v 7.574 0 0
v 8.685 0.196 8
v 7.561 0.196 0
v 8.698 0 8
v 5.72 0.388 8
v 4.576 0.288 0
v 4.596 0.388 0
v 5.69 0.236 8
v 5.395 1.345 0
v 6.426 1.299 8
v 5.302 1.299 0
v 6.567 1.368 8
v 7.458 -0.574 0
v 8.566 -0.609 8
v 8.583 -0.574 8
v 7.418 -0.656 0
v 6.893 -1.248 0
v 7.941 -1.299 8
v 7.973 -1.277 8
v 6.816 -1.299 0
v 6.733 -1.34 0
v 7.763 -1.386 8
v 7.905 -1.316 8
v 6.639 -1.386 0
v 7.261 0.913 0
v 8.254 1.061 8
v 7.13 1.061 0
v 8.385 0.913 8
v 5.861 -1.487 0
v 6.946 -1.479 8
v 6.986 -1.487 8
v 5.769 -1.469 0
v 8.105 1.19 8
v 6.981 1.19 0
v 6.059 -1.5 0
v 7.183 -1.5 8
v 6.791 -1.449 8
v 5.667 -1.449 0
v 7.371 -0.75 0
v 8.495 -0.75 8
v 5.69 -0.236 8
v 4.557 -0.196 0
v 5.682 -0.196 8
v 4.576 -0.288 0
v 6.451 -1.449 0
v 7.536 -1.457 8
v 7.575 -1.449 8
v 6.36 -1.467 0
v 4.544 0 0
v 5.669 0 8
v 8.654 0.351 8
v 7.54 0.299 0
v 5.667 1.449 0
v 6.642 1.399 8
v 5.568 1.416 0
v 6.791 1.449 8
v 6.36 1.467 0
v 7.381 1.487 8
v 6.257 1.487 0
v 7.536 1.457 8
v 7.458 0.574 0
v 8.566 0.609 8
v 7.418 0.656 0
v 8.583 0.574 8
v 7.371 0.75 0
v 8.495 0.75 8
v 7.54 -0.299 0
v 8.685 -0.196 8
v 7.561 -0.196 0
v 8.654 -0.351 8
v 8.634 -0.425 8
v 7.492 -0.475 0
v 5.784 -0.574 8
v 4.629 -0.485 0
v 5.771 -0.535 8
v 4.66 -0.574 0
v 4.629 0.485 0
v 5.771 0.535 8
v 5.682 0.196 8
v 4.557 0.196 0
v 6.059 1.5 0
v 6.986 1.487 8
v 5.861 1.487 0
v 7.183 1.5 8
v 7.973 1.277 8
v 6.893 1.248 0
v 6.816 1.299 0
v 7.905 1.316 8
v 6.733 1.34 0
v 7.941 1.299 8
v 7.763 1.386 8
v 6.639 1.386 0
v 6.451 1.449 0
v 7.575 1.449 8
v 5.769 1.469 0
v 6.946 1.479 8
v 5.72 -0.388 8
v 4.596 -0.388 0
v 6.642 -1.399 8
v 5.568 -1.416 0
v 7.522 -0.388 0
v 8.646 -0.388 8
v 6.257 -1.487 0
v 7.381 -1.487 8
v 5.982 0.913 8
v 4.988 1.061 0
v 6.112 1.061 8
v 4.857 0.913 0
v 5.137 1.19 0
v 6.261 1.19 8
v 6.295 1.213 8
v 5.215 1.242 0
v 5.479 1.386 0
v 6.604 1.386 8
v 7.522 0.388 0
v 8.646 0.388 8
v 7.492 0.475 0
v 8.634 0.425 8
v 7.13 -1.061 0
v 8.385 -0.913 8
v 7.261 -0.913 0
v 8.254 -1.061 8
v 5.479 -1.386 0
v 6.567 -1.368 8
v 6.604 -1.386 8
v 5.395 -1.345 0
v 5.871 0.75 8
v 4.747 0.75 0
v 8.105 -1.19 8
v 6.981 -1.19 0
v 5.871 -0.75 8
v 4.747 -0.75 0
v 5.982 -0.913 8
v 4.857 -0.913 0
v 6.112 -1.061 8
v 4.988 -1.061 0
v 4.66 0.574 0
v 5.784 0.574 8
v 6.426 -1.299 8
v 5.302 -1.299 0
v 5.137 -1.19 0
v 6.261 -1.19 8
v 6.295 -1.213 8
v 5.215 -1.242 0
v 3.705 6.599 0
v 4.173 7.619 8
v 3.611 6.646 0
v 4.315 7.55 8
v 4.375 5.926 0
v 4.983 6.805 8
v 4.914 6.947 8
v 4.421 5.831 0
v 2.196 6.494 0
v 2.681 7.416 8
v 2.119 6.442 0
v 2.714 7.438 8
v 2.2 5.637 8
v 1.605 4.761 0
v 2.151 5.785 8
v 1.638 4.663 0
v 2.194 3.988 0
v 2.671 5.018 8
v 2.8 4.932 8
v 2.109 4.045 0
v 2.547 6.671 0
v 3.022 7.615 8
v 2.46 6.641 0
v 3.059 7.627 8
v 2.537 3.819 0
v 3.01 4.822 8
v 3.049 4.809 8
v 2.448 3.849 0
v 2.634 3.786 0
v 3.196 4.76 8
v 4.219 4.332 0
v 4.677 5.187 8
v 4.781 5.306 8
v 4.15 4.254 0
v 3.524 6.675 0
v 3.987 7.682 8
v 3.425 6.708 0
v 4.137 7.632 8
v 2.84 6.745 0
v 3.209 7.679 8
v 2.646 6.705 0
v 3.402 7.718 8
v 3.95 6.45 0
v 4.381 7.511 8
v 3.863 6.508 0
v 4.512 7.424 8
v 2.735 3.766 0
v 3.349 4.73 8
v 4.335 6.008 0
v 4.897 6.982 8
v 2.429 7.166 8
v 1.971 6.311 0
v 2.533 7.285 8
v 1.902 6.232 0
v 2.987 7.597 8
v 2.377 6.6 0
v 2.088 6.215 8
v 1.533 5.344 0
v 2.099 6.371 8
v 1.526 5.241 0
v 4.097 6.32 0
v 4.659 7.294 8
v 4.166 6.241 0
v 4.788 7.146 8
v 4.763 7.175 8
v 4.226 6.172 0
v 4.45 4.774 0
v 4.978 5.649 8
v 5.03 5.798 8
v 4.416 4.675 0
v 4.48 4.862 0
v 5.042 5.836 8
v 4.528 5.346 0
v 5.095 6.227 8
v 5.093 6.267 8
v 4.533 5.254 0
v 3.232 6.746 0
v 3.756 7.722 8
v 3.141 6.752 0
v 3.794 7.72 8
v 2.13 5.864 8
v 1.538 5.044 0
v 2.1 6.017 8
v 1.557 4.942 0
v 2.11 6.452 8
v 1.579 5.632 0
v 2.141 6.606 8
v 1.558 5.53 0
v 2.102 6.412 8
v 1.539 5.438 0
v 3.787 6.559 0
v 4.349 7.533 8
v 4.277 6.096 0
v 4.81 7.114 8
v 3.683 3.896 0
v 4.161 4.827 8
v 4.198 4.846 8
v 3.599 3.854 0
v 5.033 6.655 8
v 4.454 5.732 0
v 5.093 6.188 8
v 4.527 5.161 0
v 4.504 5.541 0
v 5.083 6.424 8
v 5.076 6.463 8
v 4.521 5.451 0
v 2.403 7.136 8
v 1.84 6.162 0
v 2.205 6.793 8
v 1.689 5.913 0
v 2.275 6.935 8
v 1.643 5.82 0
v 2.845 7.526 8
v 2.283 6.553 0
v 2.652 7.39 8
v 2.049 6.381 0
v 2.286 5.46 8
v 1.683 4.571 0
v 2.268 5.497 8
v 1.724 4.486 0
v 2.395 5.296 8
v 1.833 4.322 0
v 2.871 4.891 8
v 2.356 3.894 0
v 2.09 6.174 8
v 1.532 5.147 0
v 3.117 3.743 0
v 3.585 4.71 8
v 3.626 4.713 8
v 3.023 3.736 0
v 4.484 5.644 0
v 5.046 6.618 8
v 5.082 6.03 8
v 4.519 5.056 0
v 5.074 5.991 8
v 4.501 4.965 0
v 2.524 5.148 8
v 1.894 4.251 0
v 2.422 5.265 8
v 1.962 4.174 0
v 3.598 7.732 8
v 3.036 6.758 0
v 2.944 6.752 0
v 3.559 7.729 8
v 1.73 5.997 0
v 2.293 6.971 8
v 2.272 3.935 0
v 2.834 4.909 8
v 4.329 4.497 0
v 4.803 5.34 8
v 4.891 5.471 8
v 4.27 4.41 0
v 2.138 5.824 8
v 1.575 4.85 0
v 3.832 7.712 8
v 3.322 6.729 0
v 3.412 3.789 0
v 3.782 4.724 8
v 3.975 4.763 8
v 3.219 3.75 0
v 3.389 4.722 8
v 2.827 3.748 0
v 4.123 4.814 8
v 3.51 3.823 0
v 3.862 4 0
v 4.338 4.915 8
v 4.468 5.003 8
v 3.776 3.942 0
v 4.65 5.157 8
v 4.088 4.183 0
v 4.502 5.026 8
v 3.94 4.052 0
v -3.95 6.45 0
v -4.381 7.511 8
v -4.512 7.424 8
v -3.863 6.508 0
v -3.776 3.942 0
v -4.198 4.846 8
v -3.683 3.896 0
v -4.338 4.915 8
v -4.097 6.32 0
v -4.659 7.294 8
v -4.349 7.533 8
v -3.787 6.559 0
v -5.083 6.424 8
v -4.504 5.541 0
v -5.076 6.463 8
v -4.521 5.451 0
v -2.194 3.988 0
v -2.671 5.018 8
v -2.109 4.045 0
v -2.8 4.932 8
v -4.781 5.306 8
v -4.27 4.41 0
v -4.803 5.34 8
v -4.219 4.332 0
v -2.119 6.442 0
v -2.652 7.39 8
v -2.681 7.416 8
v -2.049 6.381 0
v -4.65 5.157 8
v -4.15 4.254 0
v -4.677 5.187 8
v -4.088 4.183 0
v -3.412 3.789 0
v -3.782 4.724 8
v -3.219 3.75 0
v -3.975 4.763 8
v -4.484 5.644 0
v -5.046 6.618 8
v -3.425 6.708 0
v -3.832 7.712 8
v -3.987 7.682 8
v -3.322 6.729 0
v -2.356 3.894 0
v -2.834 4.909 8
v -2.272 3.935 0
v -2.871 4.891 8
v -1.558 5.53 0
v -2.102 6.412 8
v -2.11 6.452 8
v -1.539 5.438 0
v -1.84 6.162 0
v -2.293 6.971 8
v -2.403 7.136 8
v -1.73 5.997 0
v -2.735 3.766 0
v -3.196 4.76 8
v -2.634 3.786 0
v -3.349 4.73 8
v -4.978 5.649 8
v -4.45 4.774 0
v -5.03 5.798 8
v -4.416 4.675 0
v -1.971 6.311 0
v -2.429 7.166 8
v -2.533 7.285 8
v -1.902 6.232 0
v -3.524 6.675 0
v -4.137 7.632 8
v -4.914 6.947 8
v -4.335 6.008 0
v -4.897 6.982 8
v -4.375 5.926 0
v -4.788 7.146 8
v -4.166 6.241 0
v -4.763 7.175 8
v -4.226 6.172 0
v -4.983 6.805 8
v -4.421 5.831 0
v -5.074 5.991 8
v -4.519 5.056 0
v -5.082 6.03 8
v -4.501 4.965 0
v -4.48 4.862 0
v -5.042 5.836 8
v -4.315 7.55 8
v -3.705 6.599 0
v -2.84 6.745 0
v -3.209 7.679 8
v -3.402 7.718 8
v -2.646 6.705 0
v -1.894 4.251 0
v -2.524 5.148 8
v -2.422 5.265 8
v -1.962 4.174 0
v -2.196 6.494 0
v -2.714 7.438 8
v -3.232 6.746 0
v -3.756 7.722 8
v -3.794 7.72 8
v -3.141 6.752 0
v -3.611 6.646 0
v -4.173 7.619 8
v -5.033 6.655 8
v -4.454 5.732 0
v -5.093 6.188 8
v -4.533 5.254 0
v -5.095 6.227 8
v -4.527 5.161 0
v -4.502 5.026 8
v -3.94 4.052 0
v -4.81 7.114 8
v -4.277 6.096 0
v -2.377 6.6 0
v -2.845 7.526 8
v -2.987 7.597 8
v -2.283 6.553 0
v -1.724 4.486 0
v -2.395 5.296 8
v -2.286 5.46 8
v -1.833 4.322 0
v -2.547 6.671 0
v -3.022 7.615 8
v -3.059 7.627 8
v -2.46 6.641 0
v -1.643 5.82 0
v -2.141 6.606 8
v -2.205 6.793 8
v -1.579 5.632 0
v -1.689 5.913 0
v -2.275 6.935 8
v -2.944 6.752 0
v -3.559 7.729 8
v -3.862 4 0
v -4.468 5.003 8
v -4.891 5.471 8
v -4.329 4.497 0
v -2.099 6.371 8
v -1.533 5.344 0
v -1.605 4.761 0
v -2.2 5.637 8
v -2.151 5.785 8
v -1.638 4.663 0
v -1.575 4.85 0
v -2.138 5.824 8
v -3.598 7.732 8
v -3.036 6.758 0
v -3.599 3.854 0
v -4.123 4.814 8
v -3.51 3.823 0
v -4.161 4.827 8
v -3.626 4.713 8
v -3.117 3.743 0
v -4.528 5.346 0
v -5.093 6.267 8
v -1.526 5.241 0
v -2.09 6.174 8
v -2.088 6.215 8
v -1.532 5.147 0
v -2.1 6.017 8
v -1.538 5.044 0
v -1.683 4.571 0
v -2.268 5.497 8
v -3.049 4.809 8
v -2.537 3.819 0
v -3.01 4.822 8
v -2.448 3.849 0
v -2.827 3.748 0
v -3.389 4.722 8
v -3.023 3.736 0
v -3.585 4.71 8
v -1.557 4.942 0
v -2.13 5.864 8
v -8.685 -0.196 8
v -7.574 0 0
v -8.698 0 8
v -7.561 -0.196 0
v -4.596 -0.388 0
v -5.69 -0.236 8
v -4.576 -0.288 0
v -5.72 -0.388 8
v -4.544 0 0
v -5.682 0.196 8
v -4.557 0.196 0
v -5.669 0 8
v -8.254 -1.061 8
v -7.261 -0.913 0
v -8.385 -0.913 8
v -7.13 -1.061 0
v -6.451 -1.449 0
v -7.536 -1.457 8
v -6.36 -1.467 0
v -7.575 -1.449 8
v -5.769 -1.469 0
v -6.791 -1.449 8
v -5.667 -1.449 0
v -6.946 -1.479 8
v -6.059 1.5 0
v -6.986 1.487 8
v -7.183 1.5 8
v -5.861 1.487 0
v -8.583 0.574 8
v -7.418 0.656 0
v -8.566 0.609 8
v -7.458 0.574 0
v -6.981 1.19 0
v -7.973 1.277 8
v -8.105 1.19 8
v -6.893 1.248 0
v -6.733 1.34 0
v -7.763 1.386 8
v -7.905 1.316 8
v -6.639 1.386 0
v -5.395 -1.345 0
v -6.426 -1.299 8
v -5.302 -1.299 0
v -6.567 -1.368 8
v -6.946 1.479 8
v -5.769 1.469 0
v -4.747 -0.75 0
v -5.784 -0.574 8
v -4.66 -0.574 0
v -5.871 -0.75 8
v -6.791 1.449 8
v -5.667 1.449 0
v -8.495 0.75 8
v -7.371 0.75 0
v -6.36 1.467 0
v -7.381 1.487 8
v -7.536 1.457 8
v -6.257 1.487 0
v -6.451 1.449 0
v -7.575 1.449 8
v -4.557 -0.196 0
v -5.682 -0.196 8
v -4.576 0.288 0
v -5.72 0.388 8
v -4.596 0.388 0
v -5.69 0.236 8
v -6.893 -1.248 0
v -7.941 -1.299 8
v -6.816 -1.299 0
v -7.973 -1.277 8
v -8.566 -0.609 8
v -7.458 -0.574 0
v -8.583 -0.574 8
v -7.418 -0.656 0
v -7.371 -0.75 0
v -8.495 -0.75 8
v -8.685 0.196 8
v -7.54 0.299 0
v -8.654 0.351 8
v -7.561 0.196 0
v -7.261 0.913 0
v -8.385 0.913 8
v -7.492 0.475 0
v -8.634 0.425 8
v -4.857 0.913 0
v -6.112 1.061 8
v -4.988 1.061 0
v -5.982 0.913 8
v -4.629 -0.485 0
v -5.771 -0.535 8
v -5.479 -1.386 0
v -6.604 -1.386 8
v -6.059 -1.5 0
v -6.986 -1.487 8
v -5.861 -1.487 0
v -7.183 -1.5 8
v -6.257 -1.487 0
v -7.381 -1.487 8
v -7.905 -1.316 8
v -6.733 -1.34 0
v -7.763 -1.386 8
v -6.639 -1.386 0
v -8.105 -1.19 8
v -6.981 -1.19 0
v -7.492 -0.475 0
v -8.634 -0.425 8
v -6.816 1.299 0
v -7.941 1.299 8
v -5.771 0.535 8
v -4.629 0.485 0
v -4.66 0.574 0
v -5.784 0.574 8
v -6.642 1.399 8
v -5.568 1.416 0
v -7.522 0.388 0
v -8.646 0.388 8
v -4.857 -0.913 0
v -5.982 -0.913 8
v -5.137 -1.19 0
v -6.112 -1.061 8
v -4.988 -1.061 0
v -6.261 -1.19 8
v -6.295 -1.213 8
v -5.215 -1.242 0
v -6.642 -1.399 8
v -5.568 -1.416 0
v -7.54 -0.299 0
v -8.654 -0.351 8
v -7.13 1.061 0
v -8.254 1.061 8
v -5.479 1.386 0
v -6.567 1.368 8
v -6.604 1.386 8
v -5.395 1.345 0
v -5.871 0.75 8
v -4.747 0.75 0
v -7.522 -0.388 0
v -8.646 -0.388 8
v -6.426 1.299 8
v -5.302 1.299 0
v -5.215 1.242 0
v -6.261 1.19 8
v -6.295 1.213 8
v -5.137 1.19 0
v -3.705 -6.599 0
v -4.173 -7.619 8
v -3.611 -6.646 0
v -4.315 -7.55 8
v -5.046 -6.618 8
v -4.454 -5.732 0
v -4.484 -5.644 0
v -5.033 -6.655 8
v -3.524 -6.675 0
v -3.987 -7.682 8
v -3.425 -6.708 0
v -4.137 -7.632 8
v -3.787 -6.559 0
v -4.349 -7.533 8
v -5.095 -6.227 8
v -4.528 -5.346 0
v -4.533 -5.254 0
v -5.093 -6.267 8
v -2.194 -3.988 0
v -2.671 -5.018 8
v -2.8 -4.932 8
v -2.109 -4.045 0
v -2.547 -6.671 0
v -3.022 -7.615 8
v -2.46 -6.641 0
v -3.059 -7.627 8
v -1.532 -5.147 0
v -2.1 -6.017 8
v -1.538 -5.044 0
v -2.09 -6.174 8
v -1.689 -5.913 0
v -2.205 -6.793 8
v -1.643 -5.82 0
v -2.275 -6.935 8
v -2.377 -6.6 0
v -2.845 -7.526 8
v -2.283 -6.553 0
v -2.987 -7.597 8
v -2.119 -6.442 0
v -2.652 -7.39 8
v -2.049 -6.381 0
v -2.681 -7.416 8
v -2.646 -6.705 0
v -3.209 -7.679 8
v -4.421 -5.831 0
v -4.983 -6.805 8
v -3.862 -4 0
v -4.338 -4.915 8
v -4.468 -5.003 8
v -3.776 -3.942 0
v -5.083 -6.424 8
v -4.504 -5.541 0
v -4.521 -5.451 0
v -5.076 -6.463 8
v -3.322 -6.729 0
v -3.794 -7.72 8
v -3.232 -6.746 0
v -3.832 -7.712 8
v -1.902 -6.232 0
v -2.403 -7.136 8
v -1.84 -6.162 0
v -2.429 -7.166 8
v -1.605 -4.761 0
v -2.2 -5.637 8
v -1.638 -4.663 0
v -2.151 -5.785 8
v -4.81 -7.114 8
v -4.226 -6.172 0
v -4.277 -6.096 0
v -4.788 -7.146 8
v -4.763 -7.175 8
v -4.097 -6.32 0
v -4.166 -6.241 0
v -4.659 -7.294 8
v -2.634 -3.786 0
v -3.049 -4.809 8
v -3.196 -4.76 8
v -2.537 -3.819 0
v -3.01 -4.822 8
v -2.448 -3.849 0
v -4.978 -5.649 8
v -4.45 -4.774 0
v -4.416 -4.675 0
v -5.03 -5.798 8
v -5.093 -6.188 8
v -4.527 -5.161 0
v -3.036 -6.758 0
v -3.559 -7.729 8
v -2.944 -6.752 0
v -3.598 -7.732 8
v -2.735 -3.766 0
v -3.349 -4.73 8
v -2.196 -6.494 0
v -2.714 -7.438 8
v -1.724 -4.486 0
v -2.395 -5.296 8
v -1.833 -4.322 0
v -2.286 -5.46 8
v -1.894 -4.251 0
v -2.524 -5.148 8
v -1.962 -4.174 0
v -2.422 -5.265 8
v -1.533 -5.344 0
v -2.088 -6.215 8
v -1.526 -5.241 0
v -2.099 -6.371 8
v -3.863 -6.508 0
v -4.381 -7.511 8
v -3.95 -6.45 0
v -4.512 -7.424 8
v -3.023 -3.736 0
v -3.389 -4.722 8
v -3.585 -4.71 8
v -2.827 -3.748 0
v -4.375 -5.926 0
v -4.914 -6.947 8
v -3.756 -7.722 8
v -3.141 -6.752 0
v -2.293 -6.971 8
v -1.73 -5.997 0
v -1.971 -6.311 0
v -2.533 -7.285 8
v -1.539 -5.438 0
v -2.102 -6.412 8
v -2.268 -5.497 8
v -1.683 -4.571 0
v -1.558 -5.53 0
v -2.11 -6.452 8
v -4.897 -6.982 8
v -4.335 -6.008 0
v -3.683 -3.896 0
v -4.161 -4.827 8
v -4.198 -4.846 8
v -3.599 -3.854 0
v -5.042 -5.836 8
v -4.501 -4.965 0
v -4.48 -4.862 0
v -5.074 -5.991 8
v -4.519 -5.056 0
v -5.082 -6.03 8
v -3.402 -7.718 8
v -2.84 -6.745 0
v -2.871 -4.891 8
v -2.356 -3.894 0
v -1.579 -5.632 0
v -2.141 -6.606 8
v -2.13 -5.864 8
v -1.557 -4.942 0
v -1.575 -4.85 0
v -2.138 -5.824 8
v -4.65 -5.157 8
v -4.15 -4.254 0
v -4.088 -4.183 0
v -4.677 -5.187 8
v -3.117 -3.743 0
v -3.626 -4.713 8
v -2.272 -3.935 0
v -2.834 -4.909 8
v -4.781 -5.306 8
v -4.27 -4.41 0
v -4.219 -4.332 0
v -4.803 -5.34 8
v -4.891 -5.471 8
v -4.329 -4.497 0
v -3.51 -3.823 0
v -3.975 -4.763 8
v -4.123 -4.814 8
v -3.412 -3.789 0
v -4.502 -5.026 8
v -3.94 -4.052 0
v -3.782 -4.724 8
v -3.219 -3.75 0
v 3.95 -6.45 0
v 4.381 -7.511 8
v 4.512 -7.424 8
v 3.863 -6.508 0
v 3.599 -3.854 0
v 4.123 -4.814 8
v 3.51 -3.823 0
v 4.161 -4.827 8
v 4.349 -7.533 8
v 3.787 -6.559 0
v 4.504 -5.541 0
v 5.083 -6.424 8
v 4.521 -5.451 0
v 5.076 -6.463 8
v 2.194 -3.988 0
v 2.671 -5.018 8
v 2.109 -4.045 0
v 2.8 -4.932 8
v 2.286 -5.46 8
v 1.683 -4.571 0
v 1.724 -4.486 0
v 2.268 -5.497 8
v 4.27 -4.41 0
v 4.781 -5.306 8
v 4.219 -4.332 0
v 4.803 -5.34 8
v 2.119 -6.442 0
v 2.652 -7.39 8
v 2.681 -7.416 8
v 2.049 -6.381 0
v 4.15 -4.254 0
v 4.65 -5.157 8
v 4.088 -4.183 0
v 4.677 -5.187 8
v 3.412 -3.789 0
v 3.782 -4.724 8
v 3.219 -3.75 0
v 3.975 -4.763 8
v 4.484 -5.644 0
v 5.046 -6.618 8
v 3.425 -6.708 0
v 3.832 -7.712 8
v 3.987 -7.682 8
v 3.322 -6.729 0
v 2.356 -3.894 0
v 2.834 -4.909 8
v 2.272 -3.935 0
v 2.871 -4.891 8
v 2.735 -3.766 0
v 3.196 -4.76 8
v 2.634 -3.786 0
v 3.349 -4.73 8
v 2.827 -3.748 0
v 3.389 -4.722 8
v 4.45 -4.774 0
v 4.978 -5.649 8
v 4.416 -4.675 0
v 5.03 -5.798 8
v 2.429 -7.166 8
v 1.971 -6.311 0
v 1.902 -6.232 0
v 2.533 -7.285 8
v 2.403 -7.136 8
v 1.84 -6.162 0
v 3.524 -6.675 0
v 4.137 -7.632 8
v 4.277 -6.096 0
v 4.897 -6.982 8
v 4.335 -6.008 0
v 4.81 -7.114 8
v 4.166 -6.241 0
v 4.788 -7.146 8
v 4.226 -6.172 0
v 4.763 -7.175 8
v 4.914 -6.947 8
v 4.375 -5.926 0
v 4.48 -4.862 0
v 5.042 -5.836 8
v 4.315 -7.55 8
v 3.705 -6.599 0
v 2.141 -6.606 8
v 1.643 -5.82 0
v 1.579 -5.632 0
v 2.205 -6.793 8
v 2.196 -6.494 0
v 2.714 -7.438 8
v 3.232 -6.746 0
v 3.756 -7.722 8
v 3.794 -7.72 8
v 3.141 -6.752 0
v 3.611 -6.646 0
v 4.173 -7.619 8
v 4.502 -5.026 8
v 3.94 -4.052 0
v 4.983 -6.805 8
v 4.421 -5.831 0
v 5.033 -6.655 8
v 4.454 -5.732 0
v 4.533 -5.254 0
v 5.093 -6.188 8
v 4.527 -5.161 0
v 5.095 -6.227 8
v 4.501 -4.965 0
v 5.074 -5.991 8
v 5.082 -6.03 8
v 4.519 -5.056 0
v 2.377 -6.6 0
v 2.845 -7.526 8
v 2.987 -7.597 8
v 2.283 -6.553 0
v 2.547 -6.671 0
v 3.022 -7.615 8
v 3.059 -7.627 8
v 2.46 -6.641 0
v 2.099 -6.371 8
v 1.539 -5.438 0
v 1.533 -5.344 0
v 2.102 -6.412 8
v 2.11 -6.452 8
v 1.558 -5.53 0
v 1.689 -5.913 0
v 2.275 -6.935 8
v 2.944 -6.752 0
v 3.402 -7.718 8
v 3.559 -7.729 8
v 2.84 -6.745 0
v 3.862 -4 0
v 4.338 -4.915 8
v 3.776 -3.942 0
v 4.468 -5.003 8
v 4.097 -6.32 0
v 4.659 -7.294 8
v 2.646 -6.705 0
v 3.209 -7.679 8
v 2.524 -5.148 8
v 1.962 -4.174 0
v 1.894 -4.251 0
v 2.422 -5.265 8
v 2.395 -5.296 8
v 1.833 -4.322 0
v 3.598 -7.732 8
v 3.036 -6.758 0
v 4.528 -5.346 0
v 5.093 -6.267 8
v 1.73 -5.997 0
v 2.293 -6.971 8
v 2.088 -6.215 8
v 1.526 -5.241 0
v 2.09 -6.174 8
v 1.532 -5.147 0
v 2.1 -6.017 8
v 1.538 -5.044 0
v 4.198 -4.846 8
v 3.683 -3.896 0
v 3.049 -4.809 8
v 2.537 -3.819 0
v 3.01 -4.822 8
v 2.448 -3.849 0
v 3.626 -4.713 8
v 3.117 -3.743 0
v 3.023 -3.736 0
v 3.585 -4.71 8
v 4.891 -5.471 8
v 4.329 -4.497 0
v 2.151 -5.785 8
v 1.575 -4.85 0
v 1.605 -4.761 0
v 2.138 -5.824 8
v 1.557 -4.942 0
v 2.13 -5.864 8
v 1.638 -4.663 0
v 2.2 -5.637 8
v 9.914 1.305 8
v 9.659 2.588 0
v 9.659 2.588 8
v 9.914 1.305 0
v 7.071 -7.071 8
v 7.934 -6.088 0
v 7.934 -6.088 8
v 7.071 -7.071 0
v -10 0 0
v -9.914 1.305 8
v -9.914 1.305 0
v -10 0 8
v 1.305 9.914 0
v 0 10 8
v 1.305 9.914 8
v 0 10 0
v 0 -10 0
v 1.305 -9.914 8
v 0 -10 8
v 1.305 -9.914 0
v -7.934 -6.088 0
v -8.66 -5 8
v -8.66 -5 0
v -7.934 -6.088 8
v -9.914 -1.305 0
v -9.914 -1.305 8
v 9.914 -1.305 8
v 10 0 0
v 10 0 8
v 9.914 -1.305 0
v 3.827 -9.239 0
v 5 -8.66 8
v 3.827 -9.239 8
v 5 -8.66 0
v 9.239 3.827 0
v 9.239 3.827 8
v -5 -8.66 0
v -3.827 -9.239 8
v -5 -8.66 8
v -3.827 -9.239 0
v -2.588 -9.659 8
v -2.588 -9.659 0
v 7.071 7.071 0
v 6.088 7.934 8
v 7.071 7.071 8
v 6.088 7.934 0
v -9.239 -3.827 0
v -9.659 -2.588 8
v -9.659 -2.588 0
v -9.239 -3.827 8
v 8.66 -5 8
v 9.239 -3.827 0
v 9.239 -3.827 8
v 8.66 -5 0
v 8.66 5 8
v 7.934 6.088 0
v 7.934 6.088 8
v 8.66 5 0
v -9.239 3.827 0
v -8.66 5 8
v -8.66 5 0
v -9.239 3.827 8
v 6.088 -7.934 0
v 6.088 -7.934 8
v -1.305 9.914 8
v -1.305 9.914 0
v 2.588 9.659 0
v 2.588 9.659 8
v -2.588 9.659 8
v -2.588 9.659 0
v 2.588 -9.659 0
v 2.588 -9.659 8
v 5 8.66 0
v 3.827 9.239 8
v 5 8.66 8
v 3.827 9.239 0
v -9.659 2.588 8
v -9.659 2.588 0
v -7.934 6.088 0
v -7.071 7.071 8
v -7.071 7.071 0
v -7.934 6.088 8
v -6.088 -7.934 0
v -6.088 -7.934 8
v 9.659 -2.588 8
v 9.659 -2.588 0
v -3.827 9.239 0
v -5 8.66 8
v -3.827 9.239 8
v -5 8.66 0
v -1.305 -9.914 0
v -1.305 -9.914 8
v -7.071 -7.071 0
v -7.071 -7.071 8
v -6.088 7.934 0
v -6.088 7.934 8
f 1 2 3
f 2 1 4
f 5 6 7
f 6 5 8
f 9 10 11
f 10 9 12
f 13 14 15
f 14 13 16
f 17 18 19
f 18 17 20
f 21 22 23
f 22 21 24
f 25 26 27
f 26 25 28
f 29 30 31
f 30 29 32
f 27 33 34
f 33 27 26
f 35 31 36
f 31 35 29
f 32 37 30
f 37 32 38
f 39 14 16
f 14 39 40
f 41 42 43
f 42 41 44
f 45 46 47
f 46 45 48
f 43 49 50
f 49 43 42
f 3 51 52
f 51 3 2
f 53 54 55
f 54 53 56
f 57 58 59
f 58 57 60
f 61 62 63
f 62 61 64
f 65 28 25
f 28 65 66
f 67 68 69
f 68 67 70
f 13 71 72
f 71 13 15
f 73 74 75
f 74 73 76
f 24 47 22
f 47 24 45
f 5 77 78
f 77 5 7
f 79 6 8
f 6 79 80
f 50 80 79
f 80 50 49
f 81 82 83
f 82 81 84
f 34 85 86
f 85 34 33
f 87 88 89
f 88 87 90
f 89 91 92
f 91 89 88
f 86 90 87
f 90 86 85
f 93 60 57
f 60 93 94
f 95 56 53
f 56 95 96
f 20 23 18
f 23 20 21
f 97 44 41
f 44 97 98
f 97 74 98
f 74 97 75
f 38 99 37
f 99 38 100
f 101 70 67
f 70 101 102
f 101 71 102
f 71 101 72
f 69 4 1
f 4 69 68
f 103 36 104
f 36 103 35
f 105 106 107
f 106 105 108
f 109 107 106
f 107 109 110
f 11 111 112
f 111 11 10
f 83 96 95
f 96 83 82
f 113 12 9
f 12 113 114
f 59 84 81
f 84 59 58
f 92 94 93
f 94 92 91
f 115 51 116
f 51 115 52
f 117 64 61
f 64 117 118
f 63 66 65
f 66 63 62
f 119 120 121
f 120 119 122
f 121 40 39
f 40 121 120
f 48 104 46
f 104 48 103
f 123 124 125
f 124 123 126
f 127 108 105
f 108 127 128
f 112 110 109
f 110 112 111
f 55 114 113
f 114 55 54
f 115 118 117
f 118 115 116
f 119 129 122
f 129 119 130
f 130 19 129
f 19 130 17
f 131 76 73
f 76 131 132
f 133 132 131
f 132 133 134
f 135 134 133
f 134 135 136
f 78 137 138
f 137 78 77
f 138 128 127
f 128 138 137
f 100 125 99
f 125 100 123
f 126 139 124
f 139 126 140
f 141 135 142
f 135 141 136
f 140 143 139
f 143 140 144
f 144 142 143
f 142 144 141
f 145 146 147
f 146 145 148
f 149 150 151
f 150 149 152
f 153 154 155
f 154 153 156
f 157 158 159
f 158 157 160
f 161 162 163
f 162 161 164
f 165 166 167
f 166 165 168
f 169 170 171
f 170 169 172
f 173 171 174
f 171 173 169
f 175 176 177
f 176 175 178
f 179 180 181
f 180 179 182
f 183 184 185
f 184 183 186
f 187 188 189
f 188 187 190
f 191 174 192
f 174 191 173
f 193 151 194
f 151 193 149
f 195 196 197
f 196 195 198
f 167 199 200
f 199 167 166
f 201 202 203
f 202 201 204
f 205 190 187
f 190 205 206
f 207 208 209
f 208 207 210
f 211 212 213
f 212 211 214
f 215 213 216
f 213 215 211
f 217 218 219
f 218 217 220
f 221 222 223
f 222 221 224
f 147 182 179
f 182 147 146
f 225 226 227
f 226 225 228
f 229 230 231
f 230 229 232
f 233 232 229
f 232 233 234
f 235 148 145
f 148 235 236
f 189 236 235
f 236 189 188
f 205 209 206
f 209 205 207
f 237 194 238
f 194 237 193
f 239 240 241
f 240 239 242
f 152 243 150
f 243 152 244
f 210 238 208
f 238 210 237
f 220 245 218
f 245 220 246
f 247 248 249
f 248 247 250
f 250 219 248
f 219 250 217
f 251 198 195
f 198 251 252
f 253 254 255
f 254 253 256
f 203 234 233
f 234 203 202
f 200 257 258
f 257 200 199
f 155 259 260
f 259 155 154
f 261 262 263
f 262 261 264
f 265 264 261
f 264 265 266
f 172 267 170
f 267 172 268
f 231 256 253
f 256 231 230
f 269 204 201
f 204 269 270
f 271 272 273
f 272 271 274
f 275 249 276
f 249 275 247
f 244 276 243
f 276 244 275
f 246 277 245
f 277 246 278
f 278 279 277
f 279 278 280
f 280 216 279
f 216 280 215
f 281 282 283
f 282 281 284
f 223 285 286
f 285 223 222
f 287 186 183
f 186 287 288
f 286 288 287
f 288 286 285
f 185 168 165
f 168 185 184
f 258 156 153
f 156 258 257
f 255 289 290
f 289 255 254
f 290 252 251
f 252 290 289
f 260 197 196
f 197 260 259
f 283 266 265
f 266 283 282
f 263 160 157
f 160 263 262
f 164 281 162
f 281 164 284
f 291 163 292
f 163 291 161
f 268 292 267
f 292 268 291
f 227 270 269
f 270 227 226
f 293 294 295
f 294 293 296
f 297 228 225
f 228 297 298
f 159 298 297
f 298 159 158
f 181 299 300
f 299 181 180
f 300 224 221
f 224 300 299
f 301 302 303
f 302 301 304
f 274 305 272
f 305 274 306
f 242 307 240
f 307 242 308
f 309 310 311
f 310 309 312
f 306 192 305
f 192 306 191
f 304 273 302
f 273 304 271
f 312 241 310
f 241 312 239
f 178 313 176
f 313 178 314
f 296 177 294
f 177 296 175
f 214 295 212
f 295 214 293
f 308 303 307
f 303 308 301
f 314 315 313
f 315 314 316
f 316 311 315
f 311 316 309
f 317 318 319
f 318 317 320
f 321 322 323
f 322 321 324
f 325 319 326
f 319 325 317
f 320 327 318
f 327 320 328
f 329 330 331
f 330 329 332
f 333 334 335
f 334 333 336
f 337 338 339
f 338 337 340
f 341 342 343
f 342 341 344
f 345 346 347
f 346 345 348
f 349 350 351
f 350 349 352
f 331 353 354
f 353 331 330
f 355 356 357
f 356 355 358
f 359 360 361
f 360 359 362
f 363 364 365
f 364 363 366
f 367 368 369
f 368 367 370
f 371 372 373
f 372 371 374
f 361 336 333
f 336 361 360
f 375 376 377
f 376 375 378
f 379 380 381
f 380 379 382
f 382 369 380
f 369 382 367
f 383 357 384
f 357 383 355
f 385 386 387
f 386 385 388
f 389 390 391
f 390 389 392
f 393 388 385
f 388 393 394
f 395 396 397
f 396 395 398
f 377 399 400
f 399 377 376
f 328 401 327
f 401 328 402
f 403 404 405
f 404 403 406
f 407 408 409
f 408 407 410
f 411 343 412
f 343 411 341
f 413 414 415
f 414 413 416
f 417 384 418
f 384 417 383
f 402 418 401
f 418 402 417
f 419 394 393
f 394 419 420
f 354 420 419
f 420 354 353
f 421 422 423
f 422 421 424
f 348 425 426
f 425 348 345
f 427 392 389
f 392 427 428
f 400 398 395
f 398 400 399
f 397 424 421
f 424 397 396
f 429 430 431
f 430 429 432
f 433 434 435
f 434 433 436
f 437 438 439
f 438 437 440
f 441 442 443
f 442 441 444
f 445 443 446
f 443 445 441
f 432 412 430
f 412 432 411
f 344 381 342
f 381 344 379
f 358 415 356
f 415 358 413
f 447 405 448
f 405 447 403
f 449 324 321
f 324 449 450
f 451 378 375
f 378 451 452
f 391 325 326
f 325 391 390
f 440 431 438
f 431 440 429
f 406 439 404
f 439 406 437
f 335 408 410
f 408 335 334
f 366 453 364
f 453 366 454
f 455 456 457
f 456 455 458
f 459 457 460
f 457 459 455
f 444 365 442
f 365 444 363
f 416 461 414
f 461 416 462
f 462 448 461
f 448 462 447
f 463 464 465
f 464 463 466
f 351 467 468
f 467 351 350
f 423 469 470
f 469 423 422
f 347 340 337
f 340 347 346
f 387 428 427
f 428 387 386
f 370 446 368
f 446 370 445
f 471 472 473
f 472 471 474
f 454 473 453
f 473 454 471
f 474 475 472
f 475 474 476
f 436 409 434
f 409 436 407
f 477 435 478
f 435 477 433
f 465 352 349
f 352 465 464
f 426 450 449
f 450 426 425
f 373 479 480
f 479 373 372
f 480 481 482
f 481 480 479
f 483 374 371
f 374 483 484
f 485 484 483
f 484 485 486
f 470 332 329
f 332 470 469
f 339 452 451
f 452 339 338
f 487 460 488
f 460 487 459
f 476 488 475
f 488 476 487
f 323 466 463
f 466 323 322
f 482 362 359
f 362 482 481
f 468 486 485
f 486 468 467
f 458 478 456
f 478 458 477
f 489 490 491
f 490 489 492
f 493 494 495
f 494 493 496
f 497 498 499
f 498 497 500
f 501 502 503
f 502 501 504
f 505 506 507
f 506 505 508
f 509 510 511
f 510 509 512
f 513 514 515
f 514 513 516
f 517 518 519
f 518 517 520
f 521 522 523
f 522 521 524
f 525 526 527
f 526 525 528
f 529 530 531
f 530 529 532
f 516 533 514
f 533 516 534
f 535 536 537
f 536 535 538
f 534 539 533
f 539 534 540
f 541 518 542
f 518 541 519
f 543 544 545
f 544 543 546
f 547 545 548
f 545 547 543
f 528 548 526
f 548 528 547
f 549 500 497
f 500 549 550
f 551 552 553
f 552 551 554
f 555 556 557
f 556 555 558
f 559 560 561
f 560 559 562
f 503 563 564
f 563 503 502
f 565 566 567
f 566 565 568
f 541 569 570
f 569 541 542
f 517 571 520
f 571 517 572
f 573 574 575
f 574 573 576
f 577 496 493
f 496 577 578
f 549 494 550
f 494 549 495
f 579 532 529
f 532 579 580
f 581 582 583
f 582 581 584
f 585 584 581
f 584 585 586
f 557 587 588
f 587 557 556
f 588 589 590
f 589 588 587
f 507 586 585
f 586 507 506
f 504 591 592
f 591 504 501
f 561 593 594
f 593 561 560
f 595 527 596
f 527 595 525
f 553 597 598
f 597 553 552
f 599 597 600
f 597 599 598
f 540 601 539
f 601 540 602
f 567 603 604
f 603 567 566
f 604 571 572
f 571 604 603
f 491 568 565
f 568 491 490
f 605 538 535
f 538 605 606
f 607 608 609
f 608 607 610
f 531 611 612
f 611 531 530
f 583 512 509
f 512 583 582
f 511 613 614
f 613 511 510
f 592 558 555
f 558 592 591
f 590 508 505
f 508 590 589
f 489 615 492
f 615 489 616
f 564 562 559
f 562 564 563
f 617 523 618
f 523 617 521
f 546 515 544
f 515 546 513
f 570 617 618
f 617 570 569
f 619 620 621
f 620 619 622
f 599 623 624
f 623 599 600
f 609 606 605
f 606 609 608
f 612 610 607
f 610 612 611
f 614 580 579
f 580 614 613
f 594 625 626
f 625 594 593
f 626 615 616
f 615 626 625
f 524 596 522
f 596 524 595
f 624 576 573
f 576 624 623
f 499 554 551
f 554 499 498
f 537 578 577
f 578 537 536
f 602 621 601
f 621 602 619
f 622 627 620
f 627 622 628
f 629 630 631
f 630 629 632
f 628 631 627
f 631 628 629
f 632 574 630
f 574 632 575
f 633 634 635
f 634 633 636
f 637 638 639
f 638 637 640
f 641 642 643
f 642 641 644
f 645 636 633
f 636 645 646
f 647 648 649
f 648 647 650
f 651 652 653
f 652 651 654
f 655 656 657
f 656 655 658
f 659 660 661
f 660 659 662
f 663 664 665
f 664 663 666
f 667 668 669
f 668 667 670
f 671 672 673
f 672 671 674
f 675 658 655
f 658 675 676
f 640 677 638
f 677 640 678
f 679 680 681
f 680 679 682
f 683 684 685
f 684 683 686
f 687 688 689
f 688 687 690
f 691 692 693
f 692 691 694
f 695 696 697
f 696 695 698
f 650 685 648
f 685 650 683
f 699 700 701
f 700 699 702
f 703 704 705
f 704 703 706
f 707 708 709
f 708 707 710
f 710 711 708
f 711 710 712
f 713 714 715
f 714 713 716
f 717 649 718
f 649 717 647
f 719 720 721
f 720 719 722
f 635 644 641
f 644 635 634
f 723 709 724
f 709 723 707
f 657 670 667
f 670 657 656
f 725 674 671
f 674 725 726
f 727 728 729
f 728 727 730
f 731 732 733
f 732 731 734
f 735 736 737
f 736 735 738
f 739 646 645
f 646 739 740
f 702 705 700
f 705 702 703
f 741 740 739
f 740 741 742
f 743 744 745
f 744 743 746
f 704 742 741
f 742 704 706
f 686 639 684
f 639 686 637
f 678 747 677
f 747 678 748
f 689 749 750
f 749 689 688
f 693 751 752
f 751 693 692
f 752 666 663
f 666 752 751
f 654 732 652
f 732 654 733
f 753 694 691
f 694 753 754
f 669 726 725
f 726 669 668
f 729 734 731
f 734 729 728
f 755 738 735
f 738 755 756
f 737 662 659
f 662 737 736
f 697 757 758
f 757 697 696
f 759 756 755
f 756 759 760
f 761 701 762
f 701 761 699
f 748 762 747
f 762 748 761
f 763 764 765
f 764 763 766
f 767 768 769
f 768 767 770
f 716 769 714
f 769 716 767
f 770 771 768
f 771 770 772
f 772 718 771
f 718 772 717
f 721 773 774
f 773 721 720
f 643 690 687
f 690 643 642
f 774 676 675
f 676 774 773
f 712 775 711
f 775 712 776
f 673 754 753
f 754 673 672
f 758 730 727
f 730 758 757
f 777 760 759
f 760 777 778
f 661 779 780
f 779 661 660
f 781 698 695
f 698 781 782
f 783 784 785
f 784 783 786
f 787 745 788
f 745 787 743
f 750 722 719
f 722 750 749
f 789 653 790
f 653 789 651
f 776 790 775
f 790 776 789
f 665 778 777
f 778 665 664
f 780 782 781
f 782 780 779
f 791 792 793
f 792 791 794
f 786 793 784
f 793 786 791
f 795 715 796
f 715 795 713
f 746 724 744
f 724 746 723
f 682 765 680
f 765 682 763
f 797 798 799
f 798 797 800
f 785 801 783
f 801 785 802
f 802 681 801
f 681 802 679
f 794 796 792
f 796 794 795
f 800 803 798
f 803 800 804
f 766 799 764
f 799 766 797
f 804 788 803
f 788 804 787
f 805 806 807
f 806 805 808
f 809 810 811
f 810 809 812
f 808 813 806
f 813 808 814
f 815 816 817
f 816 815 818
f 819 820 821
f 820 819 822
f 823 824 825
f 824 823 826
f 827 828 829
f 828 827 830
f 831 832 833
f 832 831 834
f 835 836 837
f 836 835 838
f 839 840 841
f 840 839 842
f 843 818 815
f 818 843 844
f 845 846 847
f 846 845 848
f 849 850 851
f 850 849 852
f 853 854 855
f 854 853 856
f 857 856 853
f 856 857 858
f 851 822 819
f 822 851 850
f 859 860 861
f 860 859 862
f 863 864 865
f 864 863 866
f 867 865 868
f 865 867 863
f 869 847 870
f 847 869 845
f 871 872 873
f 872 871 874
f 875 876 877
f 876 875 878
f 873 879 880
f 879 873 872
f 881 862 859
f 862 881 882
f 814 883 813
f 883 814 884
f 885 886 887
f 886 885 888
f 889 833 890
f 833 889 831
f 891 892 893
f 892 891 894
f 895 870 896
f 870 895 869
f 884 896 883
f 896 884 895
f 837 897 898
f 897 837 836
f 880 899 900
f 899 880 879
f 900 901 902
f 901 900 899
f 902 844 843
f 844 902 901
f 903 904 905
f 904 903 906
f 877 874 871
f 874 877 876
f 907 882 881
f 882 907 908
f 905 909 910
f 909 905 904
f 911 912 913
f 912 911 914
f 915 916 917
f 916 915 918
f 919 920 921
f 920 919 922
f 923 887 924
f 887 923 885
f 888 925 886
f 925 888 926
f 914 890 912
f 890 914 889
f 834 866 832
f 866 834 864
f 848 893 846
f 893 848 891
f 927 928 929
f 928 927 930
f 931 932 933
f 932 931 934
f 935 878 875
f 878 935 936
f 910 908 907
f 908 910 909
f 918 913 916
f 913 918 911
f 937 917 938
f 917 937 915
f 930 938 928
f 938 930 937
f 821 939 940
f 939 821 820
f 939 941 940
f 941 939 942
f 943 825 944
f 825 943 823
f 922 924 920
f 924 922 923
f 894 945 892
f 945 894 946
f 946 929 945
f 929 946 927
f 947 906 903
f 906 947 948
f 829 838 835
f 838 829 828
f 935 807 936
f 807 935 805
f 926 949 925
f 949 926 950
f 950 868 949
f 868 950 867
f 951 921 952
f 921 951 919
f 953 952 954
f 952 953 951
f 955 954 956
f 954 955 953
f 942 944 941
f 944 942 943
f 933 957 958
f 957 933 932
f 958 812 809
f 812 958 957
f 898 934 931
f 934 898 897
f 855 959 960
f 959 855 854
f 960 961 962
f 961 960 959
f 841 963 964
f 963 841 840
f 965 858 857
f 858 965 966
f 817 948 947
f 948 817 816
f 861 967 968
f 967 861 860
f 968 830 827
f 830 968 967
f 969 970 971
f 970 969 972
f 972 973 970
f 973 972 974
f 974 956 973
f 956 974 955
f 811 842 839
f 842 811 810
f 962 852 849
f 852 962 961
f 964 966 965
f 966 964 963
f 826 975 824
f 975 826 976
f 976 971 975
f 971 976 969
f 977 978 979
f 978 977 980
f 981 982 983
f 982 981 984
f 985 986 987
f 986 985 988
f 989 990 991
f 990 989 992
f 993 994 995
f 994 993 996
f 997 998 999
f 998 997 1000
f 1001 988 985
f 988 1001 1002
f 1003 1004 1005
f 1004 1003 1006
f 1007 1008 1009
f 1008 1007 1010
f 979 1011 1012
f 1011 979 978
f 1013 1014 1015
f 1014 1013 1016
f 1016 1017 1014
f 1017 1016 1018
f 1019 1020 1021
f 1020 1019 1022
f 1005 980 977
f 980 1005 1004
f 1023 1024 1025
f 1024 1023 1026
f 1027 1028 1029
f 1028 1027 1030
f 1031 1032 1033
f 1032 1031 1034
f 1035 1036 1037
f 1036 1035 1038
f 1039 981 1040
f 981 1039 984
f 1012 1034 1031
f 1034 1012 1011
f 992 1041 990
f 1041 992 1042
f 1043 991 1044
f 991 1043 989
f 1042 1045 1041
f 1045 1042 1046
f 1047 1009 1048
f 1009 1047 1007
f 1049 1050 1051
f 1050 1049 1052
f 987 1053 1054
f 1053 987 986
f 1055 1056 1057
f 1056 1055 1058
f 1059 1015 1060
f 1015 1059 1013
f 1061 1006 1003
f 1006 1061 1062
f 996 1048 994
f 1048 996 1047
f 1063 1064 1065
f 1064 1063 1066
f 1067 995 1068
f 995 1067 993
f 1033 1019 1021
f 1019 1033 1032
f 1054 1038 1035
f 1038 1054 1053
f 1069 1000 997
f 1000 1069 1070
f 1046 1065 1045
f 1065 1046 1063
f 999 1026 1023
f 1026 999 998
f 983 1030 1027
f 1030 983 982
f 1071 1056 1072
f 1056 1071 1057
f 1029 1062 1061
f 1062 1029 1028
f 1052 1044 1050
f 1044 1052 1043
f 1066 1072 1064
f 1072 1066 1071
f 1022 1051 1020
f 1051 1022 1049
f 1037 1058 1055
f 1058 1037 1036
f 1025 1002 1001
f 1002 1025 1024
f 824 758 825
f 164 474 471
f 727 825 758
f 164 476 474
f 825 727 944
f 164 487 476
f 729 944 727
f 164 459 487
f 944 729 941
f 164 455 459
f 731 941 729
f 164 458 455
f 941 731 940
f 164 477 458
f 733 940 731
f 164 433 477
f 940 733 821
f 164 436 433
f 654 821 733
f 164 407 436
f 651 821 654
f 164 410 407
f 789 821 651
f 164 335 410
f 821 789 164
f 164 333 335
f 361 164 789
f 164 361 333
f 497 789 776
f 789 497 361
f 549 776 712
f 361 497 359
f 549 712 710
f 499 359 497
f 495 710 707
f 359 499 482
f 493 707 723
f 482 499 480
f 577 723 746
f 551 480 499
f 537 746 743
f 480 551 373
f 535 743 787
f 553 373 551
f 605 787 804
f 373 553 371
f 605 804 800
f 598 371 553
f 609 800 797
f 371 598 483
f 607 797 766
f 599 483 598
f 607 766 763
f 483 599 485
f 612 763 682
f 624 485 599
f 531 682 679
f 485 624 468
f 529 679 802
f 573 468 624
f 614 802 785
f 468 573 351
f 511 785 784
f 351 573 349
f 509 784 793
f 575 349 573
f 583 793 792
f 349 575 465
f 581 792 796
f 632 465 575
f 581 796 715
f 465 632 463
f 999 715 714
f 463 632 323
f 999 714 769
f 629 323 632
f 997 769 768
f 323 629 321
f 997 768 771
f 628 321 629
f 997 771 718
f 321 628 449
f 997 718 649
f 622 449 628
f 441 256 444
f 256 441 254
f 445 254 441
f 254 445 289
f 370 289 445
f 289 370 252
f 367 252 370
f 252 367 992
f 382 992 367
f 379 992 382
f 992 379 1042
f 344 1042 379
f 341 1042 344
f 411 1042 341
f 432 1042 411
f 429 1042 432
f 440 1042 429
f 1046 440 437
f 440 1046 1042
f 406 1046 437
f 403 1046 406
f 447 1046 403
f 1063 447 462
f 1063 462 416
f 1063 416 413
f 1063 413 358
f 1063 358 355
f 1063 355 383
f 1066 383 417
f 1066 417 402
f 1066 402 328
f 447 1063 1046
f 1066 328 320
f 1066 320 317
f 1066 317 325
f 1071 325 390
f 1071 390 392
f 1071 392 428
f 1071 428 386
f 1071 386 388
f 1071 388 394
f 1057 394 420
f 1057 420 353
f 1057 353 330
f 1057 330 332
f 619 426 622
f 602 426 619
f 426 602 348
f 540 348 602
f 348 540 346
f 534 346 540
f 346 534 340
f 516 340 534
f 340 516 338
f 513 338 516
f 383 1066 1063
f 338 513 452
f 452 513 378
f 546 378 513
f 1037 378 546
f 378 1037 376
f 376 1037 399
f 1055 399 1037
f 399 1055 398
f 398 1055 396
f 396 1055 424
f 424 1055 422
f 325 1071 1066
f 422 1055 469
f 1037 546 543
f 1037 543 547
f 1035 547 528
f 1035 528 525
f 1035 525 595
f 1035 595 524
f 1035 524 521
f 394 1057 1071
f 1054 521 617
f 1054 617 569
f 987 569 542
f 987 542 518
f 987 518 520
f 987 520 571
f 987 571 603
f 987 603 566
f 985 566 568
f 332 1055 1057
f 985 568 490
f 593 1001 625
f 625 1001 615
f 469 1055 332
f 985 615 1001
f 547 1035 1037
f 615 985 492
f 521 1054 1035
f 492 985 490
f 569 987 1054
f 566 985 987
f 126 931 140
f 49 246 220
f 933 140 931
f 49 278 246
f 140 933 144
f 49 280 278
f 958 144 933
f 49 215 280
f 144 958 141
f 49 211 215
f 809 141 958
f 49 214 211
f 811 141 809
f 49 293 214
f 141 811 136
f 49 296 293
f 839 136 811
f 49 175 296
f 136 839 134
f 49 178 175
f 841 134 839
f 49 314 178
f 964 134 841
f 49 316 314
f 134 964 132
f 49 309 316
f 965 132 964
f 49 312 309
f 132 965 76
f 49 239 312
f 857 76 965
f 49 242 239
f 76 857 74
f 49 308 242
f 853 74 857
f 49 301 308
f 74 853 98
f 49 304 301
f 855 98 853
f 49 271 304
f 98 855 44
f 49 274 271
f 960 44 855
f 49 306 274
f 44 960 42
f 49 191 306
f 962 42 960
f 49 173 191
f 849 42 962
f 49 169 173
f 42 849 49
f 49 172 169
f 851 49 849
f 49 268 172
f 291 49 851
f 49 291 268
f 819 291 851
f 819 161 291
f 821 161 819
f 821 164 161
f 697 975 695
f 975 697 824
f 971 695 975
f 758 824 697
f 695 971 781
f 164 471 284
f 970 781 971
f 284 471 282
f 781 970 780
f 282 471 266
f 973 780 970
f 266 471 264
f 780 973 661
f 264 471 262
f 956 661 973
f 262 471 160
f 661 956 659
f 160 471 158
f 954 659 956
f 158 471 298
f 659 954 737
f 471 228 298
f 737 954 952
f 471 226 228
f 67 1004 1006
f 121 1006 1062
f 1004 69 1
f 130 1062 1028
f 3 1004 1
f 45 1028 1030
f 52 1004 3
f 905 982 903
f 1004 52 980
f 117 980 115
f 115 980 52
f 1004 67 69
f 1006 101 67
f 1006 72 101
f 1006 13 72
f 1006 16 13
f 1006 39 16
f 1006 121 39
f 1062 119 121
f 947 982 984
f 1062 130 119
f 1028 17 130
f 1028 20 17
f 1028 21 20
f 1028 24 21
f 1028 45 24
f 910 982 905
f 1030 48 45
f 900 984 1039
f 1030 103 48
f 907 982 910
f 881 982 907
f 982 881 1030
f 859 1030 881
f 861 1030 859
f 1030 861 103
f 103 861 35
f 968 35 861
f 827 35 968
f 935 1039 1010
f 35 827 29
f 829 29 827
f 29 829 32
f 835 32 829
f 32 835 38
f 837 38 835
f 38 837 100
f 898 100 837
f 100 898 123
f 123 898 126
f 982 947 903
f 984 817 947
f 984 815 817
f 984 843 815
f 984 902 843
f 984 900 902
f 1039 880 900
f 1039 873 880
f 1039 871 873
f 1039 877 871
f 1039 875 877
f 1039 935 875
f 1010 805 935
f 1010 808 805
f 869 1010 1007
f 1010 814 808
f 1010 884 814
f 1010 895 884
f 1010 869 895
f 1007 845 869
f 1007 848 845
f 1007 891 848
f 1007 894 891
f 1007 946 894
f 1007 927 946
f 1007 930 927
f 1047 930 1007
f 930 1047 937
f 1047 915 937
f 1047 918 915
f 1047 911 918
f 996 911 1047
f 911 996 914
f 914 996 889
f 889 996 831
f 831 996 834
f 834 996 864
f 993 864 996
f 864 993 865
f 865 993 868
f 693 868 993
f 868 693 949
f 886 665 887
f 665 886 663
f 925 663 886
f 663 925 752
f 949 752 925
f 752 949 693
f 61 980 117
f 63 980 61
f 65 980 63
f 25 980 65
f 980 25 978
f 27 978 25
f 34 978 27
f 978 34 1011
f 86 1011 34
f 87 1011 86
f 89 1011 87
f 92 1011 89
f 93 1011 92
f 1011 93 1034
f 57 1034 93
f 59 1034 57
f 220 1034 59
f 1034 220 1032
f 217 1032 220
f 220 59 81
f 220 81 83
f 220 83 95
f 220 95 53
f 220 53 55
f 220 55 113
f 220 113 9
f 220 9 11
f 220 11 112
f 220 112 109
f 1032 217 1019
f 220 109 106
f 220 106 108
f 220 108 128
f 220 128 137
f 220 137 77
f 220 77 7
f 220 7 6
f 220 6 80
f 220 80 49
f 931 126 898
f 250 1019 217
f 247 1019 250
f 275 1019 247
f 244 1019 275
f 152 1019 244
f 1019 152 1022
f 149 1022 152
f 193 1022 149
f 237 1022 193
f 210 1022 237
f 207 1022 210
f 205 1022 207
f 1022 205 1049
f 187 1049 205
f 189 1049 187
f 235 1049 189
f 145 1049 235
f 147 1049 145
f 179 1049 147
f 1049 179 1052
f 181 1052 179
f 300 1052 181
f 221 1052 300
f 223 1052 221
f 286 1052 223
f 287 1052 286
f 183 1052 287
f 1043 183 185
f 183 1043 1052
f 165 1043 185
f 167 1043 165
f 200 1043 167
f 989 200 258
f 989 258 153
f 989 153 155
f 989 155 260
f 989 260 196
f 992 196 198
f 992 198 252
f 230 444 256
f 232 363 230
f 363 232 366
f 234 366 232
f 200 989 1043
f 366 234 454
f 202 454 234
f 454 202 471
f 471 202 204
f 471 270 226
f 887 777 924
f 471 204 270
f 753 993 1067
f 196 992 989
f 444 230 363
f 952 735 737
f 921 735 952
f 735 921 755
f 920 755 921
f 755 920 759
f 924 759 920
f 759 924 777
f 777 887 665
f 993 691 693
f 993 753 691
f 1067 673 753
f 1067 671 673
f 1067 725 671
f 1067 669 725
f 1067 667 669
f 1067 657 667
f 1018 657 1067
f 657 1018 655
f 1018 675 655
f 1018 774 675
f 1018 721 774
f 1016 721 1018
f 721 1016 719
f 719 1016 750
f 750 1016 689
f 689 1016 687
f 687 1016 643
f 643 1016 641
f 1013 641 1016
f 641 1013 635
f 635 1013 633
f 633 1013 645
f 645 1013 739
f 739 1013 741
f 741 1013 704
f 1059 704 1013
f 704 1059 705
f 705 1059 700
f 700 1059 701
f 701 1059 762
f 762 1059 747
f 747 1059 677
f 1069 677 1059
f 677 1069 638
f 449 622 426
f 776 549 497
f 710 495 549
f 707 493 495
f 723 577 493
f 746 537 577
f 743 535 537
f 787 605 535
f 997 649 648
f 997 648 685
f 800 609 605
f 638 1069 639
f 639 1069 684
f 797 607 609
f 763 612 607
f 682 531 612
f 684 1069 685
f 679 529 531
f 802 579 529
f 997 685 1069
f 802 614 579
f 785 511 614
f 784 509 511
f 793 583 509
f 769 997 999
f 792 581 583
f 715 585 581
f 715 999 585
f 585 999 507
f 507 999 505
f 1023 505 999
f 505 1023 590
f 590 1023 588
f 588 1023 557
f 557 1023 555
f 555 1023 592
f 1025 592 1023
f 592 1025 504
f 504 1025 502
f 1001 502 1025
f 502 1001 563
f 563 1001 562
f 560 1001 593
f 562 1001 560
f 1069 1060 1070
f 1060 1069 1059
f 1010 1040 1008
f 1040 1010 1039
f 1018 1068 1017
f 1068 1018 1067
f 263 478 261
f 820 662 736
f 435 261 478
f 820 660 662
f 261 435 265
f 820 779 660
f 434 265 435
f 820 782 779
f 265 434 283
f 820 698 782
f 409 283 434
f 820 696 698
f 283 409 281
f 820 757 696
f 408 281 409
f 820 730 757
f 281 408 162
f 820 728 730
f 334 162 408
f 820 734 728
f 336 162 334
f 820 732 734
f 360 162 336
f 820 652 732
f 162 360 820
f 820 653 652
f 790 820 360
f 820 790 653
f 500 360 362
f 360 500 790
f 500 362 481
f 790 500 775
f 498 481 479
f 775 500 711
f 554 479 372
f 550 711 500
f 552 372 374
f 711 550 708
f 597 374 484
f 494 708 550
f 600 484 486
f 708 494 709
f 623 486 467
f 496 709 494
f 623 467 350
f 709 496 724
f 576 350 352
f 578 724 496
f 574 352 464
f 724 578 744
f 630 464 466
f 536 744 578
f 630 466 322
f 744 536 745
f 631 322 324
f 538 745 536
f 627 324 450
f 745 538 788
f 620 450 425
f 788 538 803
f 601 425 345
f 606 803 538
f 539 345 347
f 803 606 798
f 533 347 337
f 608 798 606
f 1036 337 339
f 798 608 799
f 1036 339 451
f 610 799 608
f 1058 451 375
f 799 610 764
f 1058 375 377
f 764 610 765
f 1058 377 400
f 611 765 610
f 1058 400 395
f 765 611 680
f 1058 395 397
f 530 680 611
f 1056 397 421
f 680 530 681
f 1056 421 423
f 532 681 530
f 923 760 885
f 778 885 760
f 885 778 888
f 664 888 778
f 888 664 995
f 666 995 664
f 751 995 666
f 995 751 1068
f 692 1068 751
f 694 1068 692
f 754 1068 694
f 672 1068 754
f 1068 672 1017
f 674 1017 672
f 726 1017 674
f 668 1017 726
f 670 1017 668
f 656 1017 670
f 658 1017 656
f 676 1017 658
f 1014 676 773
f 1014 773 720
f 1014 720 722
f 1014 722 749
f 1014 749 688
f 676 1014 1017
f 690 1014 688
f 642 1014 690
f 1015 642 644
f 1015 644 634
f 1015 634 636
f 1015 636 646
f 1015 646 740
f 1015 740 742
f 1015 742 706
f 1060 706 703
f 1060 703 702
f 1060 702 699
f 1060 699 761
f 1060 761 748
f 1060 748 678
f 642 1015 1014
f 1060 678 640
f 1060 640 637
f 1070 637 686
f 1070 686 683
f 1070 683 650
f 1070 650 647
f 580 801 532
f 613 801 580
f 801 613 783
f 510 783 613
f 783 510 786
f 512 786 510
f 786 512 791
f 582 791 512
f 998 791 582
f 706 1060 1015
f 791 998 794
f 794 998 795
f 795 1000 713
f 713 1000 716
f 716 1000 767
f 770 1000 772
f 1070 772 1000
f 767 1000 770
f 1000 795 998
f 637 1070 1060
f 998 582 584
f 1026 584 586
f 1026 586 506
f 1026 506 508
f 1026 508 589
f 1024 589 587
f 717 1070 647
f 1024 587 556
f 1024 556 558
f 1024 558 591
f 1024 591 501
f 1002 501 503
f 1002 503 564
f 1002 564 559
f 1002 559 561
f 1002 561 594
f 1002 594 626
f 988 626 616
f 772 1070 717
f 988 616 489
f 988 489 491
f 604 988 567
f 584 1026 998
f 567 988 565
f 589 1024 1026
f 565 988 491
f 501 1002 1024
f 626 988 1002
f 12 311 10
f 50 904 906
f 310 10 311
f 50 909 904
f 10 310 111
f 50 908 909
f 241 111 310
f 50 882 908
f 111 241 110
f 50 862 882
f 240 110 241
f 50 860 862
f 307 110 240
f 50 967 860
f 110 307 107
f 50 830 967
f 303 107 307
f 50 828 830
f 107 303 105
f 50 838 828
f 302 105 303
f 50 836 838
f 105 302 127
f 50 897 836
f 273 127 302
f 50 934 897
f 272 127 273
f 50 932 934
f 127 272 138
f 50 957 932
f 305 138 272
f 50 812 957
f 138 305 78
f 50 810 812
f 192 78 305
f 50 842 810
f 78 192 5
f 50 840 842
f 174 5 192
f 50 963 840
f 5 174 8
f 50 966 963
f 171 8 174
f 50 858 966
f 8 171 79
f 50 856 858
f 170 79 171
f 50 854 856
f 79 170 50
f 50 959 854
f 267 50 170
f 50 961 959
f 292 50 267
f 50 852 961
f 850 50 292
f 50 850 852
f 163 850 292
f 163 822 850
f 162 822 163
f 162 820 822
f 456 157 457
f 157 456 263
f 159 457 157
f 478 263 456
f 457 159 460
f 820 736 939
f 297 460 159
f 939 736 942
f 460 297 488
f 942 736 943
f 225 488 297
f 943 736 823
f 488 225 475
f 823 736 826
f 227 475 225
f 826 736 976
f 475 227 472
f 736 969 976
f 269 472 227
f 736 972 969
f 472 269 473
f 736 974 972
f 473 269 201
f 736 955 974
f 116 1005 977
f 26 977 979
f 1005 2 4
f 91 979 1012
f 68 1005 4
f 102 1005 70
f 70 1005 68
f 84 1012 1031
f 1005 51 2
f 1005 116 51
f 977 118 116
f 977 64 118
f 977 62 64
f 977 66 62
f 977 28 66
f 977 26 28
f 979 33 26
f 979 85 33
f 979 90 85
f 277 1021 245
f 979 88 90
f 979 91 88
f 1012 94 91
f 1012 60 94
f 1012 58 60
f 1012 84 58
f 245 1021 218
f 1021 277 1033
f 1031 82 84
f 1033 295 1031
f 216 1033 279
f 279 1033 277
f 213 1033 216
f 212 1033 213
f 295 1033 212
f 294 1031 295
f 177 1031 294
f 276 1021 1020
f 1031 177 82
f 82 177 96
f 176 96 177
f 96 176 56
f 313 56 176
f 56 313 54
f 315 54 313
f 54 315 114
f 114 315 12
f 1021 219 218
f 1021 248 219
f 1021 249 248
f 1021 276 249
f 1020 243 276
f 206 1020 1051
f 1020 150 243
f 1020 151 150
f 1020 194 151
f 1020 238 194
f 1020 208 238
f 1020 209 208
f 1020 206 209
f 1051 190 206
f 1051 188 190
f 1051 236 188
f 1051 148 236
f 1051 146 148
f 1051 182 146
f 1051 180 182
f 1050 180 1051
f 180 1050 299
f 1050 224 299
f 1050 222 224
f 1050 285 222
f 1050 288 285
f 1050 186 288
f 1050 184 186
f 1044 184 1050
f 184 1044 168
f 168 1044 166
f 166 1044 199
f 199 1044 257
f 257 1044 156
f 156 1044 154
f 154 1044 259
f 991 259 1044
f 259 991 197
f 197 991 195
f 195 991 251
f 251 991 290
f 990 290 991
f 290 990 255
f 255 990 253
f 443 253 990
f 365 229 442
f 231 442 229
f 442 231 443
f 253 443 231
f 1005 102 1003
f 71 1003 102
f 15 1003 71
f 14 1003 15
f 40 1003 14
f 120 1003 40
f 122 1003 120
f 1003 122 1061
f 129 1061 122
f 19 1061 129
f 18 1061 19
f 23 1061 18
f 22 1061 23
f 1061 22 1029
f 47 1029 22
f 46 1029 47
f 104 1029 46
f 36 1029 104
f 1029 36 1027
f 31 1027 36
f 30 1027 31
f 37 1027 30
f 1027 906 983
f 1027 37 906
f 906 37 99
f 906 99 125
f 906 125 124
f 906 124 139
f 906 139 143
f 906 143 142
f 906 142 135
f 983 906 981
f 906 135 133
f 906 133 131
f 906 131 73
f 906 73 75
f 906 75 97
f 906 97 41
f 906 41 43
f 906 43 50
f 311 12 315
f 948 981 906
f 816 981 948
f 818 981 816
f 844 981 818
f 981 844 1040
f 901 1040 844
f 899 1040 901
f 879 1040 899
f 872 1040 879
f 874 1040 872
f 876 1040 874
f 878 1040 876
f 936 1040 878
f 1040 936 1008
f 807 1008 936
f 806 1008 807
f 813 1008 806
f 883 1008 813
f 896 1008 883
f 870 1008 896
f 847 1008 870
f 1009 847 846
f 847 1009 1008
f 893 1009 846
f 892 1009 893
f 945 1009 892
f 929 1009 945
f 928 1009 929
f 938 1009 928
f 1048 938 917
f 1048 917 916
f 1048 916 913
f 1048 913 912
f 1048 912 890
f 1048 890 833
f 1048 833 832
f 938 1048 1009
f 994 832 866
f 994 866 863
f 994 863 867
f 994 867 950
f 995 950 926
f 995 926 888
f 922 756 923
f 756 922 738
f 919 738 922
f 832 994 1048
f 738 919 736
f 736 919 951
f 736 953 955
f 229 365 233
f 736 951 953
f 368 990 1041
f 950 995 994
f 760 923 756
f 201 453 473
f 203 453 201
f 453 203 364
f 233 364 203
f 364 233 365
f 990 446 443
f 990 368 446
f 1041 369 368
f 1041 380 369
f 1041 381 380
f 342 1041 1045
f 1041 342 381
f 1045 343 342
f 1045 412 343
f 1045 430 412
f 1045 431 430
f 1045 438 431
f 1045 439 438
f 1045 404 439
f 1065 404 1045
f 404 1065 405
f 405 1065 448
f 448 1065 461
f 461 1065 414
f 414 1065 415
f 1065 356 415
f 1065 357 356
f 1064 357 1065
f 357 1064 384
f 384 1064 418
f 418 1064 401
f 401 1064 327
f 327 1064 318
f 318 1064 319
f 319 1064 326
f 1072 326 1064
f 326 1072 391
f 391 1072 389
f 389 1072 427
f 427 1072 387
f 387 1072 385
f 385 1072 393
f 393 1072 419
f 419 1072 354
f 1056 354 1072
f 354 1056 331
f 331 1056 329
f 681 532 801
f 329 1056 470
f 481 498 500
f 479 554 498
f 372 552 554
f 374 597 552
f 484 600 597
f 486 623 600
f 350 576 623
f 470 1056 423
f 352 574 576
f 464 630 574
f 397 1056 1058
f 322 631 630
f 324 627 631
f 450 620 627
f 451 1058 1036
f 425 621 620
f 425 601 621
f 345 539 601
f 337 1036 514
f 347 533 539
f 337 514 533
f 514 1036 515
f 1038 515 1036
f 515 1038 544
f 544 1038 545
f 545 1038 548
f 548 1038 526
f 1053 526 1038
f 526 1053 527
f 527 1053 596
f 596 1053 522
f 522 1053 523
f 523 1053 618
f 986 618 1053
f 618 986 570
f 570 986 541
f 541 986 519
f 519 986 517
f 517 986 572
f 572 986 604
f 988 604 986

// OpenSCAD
$fn = 48;
difference() {
  cylinder(h = 8, r = 10);
  // 6 angled bores — same pattern as the wire twister, simplified.
  for (i = [0:5]) {
    rotate(i * 60, [0, 0, 1])
    rotate(8, [0, 1, 0])
    translate([6, 0, 0])
      cylinder(h = 30, r = 1.5, center = true);
  }
}
